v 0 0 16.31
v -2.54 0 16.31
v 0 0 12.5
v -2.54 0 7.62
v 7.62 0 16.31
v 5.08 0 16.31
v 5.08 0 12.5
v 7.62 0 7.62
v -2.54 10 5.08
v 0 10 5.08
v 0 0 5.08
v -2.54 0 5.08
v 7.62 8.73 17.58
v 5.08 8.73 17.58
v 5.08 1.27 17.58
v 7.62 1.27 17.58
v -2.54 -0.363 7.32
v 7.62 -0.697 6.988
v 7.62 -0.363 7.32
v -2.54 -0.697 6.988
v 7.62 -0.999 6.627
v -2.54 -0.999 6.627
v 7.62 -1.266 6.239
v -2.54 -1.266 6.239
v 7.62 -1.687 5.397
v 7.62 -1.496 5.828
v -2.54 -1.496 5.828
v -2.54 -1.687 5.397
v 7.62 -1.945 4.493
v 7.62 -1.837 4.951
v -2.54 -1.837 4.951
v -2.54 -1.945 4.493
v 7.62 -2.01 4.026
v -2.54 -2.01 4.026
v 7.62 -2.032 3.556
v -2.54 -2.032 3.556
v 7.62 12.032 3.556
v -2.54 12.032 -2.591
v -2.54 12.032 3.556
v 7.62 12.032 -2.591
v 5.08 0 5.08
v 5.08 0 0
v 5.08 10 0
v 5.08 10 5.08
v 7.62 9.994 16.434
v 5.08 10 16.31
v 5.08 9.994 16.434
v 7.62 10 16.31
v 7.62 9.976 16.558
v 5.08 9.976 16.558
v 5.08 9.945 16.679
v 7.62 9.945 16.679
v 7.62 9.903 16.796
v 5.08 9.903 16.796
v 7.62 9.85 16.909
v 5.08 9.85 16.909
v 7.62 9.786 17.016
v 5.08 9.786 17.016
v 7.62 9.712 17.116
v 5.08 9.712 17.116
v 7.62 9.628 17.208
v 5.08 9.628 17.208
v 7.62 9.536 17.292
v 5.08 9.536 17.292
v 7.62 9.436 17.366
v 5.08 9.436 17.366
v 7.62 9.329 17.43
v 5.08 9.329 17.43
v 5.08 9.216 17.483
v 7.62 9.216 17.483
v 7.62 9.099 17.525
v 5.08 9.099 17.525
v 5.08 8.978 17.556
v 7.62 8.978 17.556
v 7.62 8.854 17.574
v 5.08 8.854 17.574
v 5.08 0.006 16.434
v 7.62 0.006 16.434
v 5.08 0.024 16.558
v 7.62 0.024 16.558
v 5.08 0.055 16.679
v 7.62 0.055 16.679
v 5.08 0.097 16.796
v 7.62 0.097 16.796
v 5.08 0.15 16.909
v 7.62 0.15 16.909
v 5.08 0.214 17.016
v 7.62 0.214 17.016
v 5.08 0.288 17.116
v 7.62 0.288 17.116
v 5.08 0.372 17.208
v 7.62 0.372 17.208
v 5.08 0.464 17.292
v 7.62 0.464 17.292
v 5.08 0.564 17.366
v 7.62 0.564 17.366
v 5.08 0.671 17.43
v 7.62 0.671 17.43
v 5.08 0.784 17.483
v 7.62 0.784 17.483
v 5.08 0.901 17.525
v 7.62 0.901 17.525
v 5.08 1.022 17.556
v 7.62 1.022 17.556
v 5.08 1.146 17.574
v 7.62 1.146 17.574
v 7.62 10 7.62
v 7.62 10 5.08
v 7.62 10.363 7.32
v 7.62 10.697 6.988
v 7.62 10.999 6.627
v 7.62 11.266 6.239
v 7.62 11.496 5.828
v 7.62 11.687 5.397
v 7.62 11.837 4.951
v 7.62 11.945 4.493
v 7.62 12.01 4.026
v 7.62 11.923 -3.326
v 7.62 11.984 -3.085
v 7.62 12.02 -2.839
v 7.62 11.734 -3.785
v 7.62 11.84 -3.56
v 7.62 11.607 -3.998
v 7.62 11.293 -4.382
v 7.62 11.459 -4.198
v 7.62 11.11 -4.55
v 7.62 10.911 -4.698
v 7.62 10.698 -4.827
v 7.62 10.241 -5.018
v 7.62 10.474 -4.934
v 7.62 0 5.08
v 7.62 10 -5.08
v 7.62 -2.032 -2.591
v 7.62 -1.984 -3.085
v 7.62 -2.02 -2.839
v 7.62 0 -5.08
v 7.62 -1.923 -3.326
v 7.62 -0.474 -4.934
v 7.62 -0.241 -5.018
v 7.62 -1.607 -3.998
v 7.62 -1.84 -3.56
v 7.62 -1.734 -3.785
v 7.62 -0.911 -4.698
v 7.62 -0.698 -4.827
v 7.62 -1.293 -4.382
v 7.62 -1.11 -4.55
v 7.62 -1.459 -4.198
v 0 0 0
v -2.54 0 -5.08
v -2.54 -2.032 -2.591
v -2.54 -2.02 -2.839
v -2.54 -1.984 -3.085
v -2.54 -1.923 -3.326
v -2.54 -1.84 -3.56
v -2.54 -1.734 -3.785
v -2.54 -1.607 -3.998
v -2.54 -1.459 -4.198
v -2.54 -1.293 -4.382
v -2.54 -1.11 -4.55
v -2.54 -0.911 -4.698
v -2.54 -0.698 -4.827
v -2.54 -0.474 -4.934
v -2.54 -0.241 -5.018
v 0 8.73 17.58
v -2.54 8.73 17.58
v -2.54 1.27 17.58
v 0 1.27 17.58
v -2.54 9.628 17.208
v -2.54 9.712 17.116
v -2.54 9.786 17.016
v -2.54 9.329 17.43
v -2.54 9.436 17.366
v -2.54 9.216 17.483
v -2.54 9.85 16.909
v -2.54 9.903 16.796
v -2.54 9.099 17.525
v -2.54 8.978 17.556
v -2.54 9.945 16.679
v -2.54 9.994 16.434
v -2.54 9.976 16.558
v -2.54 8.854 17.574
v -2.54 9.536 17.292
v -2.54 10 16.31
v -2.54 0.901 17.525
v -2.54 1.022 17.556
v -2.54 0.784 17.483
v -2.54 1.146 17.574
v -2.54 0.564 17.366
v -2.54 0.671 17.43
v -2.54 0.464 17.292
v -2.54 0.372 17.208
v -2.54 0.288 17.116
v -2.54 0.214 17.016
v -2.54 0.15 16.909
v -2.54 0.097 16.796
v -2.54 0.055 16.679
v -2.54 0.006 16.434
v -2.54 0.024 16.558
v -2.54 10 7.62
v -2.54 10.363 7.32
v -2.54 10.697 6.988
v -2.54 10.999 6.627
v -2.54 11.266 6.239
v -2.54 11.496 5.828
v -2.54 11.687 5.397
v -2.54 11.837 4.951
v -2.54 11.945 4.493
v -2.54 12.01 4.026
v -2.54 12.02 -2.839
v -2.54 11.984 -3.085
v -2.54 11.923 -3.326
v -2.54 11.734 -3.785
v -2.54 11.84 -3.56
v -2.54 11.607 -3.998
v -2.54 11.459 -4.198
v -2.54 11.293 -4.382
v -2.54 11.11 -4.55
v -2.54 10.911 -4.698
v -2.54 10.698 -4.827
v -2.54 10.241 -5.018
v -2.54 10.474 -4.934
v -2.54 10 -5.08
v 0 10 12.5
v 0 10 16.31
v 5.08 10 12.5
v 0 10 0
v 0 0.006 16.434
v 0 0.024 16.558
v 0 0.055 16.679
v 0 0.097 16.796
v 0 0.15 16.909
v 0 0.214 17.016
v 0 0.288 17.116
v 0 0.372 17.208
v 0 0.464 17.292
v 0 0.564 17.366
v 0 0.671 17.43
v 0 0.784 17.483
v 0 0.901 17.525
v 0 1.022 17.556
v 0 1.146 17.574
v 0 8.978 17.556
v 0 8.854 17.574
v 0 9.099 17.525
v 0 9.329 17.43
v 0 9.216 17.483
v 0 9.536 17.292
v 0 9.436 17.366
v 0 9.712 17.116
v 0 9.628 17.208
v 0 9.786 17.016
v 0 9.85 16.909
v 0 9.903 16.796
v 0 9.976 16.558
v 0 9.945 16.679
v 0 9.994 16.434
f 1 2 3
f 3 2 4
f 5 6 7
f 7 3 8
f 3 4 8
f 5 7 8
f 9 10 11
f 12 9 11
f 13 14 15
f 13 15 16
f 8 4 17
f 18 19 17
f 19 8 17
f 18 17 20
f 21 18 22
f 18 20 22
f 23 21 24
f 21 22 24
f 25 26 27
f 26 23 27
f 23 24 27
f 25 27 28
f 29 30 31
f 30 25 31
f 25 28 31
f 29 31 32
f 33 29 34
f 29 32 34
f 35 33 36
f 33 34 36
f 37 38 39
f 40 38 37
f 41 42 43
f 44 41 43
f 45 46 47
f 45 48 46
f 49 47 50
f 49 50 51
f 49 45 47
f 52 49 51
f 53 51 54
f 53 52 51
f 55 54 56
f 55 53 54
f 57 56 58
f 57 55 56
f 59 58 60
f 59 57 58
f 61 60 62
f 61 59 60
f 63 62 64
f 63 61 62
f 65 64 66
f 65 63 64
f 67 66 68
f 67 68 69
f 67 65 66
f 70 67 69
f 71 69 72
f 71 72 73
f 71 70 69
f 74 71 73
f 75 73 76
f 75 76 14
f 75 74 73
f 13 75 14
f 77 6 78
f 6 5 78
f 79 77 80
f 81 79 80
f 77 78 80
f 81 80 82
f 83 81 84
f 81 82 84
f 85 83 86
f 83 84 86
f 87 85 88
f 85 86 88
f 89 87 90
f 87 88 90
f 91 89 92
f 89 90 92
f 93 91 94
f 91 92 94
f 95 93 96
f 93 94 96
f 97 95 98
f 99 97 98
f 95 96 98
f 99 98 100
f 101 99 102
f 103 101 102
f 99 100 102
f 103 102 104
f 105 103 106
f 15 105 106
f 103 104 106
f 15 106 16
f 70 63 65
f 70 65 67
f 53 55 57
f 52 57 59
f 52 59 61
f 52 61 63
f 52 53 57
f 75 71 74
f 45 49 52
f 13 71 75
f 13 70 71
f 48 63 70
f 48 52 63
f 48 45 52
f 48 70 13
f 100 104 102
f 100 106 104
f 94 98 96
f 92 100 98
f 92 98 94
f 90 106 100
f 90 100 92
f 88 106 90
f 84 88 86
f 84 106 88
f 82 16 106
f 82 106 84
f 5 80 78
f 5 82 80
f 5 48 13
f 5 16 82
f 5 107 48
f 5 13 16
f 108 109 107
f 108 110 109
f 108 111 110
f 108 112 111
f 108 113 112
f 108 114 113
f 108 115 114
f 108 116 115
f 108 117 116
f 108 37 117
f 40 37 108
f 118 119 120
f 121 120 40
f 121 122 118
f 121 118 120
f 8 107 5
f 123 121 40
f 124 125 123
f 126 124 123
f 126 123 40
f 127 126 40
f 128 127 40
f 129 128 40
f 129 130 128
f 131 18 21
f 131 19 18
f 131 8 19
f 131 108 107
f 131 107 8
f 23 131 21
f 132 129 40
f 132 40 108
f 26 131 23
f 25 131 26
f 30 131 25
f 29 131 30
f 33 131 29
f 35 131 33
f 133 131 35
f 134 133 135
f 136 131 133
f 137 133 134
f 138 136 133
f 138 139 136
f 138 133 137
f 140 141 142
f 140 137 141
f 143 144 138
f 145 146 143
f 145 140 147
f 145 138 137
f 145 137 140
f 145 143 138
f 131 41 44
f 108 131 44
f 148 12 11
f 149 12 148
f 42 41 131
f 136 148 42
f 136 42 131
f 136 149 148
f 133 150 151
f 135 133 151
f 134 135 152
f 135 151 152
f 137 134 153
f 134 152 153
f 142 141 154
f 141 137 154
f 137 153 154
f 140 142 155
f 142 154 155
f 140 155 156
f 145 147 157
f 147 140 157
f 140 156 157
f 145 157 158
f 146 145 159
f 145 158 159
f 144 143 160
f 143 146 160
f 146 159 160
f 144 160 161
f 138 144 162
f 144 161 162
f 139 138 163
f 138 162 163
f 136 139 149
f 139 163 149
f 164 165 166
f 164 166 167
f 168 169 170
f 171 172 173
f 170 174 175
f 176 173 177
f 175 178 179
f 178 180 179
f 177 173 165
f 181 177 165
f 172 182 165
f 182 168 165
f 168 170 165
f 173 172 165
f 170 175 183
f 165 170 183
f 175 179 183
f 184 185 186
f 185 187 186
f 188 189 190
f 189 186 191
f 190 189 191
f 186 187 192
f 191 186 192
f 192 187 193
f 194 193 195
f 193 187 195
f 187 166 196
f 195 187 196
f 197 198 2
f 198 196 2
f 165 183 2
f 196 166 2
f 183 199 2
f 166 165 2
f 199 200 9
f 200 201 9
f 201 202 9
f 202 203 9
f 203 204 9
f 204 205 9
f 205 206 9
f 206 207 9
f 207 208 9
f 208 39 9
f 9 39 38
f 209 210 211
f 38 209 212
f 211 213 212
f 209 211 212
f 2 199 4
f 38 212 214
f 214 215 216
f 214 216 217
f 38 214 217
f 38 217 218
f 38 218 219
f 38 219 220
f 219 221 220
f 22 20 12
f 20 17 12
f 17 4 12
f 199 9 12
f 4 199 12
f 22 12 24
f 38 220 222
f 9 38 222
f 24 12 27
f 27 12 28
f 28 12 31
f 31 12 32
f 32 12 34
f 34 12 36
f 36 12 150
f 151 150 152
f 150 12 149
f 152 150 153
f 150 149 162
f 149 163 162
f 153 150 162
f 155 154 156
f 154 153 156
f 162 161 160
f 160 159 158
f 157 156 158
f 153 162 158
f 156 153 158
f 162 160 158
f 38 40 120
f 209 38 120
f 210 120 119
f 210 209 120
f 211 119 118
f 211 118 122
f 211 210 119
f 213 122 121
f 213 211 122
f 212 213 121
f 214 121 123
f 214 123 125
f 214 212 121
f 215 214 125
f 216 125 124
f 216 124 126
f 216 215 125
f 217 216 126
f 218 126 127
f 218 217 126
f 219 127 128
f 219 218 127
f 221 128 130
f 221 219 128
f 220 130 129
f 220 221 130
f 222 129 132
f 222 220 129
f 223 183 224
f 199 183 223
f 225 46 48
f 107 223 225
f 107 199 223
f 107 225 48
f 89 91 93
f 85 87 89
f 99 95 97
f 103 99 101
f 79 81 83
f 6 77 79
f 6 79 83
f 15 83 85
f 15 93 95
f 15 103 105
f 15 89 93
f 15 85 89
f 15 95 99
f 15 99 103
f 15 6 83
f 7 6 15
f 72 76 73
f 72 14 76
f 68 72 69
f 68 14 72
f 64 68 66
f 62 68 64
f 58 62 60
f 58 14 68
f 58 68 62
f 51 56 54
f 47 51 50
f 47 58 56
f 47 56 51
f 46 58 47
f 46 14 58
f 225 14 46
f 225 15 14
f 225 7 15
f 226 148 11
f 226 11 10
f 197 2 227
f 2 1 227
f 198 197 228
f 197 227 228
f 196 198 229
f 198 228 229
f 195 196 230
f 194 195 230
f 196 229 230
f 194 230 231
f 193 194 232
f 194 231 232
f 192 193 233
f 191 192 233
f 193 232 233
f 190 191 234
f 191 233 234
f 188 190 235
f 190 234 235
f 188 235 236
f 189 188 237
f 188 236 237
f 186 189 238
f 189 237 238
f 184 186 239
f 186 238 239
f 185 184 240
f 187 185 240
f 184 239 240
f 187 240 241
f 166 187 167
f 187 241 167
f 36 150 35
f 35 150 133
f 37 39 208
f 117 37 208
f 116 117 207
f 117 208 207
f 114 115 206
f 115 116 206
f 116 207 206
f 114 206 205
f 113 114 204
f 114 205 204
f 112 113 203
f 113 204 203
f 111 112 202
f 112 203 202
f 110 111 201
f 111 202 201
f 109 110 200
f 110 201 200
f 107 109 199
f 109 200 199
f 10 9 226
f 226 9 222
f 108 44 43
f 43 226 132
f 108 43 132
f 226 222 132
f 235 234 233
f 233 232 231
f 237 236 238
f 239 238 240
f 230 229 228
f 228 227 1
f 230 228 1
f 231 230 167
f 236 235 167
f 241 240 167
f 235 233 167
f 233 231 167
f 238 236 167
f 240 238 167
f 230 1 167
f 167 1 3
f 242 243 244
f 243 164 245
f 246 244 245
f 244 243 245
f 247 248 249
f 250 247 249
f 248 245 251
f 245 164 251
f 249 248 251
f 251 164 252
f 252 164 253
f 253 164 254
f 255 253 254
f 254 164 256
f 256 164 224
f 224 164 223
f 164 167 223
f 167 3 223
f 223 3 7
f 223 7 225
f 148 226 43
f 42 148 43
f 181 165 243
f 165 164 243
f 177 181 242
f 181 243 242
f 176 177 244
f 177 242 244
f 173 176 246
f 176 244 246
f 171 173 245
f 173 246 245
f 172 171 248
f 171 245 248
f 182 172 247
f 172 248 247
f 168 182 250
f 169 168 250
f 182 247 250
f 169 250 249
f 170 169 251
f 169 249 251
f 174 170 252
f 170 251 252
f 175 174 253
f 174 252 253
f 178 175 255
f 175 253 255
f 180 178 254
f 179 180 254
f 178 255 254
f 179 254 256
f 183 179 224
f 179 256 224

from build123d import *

# Parameters (mm, degrees)
F0_W          = 5.08
F0_H          = 9.99998
F1_DEPTH      = 12.5
F2_W          = 9.99998
F2_H          = 7.42
F3_DEPTH      = 2.54
F4_W          = 9.99998
F4_H          = 7.42
F5_DEPTH      = 2.54
F6_W          = 2.54
F6_H          = 9.99998
F7_DEPTH      = 5.08
F8_W          = 10.16
F8_H          = 2.032
F9_DEPTH      = 5.08
F9_DEPTH_BACK = 7.62
F10_T1_DEPTH  = 30.48
F11_R         = 1.27
F12_T1_DEPTH  = 22.6034078934


# Not quite as in the source:
# - a fillet or chamfer that OpenCascade refuses, or shapes differently, is made with other operations: its cross-section is extruded or revolved along the edge and cut away or added


with BuildPart() as f1:
    # F0 (on Top) → F1 (new body)
    with BuildSketch(Plane.XY):
        with Locations((2.54, 4.99999)):
            Rectangle(F0_W, F0_H)
    extrude(amount=F1_DEPTH)

    # F2 (on face) → F3 (join)
    with BuildSketch(Plane(origin=(0, 0, 0), x_dir=(0, -1, 0), z_dir=(-1, 0, 0))):
        with Locations((-4.99999, 8.79)):
            Rectangle(F2_W, F2_H)
    extrude(amount=F3_DEPTH)

    # F4 (on face) → F5 (join)
    with BuildSketch(Plane.YZ.offset(5.08)):
        with Locations((4.99999, 8.79)):
            Rectangle(F4_W, F4_H)
    extrude(amount=F5_DEPTH)

    # F6 (on face) → F7 (join)
    with BuildSketch(Plane.XY.offset(12.5)):
        with Locations((-1.27, 4.99999)):
            Rectangle(F6_W, F6_H)
        with Locations((6.35, 4.99999)):
            Rectangle(F6_W, F6_H)
    extrude(amount=F7_DEPTH)

    # F8 (on face) → F9 (join, two sides)
    with BuildSketch(Plane(origin=(0, 0, 0), x_dir=(1, 0, 0), z_dir=(0, 0, -1))) as f9_sk:
        with Locations((2.54, 1.016)):
            Rectangle(F8_W, F8_H)
        with Locations((2.54, -11.01598)):
            Rectangle(F8_W, F8_H)
    extrude(amount=F9_DEPTH)
    extrude(f9_sk.sketch, amount=-F9_DEPTH_BACK)

    # F10: fillet of radius 5.08 on 2 edges, made by hand

    # F10_s2 → F10_t1 (cut)
    with BuildSketch(Plane.YZ.offset(-12.7)):
        with BuildLine():
            ThreePointArc((0, 7.62), (-1.4956901303, 5.8278450651), (-2.032, 3.556))
            Line((-2.032, 3.556), (-2.032, 7.62))
            Line((-2.032, 7.62), (0, 7.62))
        make_face()
        with BuildLine():
            ThreePointArc((12.03198, 3.556), (11.4956701303, 5.8278450651), (9.99998, 7.62))
            Line((9.99998, 7.62), (12.03198, 7.62))
            Line((12.03198, 7.62), (12.03198, 3.556))
        make_face()
    extrude(amount=F10_T1_DEPTH, mode=Mode.SUBTRACT)

    # F11
    f11_edges = [f1.edges().sort_by_distance(p)[0] for p in [
        (-1.27, 0, 17.58),
        (6.35, 0, 17.58),
        (6.35, 9.99998, 17.58),
        (-1.27, 9.99998, 17.58),
    ]]
    fillet(f11_edges, radius=F11_R)

    # F12: fillet of radius 2.54 on 2 edges, made by hand

    # F12_s2 → F12_t1 (cut)
    with BuildSketch(Plane.YZ.offset(-8.7617039467)):
        with BuildLine():
            ThreePointArc((-2.032, -2.5913184213), (-1.4594755399, -4.1977554727), (0, -5.08))
            Line((0, -5.08), (-2.032, -5.08))
            Line((-2.032, -5.08), (-2.032, -2.5913184213))
        make_face()
        with BuildLine():
            ThreePointArc((12.03198, -2.5913184213), (11.4594555399, -4.1977554727), (9.99998, -5.08))
            Line((9.99998, -5.08), (12.03198, -5.08))
            Line((12.03198, -5.08), (12.03198, -2.5913184213))
        make_face()
    extrude(amount=F12_T1_DEPTH, mode=Mode.SUBTRACT)


solid = f1.part
